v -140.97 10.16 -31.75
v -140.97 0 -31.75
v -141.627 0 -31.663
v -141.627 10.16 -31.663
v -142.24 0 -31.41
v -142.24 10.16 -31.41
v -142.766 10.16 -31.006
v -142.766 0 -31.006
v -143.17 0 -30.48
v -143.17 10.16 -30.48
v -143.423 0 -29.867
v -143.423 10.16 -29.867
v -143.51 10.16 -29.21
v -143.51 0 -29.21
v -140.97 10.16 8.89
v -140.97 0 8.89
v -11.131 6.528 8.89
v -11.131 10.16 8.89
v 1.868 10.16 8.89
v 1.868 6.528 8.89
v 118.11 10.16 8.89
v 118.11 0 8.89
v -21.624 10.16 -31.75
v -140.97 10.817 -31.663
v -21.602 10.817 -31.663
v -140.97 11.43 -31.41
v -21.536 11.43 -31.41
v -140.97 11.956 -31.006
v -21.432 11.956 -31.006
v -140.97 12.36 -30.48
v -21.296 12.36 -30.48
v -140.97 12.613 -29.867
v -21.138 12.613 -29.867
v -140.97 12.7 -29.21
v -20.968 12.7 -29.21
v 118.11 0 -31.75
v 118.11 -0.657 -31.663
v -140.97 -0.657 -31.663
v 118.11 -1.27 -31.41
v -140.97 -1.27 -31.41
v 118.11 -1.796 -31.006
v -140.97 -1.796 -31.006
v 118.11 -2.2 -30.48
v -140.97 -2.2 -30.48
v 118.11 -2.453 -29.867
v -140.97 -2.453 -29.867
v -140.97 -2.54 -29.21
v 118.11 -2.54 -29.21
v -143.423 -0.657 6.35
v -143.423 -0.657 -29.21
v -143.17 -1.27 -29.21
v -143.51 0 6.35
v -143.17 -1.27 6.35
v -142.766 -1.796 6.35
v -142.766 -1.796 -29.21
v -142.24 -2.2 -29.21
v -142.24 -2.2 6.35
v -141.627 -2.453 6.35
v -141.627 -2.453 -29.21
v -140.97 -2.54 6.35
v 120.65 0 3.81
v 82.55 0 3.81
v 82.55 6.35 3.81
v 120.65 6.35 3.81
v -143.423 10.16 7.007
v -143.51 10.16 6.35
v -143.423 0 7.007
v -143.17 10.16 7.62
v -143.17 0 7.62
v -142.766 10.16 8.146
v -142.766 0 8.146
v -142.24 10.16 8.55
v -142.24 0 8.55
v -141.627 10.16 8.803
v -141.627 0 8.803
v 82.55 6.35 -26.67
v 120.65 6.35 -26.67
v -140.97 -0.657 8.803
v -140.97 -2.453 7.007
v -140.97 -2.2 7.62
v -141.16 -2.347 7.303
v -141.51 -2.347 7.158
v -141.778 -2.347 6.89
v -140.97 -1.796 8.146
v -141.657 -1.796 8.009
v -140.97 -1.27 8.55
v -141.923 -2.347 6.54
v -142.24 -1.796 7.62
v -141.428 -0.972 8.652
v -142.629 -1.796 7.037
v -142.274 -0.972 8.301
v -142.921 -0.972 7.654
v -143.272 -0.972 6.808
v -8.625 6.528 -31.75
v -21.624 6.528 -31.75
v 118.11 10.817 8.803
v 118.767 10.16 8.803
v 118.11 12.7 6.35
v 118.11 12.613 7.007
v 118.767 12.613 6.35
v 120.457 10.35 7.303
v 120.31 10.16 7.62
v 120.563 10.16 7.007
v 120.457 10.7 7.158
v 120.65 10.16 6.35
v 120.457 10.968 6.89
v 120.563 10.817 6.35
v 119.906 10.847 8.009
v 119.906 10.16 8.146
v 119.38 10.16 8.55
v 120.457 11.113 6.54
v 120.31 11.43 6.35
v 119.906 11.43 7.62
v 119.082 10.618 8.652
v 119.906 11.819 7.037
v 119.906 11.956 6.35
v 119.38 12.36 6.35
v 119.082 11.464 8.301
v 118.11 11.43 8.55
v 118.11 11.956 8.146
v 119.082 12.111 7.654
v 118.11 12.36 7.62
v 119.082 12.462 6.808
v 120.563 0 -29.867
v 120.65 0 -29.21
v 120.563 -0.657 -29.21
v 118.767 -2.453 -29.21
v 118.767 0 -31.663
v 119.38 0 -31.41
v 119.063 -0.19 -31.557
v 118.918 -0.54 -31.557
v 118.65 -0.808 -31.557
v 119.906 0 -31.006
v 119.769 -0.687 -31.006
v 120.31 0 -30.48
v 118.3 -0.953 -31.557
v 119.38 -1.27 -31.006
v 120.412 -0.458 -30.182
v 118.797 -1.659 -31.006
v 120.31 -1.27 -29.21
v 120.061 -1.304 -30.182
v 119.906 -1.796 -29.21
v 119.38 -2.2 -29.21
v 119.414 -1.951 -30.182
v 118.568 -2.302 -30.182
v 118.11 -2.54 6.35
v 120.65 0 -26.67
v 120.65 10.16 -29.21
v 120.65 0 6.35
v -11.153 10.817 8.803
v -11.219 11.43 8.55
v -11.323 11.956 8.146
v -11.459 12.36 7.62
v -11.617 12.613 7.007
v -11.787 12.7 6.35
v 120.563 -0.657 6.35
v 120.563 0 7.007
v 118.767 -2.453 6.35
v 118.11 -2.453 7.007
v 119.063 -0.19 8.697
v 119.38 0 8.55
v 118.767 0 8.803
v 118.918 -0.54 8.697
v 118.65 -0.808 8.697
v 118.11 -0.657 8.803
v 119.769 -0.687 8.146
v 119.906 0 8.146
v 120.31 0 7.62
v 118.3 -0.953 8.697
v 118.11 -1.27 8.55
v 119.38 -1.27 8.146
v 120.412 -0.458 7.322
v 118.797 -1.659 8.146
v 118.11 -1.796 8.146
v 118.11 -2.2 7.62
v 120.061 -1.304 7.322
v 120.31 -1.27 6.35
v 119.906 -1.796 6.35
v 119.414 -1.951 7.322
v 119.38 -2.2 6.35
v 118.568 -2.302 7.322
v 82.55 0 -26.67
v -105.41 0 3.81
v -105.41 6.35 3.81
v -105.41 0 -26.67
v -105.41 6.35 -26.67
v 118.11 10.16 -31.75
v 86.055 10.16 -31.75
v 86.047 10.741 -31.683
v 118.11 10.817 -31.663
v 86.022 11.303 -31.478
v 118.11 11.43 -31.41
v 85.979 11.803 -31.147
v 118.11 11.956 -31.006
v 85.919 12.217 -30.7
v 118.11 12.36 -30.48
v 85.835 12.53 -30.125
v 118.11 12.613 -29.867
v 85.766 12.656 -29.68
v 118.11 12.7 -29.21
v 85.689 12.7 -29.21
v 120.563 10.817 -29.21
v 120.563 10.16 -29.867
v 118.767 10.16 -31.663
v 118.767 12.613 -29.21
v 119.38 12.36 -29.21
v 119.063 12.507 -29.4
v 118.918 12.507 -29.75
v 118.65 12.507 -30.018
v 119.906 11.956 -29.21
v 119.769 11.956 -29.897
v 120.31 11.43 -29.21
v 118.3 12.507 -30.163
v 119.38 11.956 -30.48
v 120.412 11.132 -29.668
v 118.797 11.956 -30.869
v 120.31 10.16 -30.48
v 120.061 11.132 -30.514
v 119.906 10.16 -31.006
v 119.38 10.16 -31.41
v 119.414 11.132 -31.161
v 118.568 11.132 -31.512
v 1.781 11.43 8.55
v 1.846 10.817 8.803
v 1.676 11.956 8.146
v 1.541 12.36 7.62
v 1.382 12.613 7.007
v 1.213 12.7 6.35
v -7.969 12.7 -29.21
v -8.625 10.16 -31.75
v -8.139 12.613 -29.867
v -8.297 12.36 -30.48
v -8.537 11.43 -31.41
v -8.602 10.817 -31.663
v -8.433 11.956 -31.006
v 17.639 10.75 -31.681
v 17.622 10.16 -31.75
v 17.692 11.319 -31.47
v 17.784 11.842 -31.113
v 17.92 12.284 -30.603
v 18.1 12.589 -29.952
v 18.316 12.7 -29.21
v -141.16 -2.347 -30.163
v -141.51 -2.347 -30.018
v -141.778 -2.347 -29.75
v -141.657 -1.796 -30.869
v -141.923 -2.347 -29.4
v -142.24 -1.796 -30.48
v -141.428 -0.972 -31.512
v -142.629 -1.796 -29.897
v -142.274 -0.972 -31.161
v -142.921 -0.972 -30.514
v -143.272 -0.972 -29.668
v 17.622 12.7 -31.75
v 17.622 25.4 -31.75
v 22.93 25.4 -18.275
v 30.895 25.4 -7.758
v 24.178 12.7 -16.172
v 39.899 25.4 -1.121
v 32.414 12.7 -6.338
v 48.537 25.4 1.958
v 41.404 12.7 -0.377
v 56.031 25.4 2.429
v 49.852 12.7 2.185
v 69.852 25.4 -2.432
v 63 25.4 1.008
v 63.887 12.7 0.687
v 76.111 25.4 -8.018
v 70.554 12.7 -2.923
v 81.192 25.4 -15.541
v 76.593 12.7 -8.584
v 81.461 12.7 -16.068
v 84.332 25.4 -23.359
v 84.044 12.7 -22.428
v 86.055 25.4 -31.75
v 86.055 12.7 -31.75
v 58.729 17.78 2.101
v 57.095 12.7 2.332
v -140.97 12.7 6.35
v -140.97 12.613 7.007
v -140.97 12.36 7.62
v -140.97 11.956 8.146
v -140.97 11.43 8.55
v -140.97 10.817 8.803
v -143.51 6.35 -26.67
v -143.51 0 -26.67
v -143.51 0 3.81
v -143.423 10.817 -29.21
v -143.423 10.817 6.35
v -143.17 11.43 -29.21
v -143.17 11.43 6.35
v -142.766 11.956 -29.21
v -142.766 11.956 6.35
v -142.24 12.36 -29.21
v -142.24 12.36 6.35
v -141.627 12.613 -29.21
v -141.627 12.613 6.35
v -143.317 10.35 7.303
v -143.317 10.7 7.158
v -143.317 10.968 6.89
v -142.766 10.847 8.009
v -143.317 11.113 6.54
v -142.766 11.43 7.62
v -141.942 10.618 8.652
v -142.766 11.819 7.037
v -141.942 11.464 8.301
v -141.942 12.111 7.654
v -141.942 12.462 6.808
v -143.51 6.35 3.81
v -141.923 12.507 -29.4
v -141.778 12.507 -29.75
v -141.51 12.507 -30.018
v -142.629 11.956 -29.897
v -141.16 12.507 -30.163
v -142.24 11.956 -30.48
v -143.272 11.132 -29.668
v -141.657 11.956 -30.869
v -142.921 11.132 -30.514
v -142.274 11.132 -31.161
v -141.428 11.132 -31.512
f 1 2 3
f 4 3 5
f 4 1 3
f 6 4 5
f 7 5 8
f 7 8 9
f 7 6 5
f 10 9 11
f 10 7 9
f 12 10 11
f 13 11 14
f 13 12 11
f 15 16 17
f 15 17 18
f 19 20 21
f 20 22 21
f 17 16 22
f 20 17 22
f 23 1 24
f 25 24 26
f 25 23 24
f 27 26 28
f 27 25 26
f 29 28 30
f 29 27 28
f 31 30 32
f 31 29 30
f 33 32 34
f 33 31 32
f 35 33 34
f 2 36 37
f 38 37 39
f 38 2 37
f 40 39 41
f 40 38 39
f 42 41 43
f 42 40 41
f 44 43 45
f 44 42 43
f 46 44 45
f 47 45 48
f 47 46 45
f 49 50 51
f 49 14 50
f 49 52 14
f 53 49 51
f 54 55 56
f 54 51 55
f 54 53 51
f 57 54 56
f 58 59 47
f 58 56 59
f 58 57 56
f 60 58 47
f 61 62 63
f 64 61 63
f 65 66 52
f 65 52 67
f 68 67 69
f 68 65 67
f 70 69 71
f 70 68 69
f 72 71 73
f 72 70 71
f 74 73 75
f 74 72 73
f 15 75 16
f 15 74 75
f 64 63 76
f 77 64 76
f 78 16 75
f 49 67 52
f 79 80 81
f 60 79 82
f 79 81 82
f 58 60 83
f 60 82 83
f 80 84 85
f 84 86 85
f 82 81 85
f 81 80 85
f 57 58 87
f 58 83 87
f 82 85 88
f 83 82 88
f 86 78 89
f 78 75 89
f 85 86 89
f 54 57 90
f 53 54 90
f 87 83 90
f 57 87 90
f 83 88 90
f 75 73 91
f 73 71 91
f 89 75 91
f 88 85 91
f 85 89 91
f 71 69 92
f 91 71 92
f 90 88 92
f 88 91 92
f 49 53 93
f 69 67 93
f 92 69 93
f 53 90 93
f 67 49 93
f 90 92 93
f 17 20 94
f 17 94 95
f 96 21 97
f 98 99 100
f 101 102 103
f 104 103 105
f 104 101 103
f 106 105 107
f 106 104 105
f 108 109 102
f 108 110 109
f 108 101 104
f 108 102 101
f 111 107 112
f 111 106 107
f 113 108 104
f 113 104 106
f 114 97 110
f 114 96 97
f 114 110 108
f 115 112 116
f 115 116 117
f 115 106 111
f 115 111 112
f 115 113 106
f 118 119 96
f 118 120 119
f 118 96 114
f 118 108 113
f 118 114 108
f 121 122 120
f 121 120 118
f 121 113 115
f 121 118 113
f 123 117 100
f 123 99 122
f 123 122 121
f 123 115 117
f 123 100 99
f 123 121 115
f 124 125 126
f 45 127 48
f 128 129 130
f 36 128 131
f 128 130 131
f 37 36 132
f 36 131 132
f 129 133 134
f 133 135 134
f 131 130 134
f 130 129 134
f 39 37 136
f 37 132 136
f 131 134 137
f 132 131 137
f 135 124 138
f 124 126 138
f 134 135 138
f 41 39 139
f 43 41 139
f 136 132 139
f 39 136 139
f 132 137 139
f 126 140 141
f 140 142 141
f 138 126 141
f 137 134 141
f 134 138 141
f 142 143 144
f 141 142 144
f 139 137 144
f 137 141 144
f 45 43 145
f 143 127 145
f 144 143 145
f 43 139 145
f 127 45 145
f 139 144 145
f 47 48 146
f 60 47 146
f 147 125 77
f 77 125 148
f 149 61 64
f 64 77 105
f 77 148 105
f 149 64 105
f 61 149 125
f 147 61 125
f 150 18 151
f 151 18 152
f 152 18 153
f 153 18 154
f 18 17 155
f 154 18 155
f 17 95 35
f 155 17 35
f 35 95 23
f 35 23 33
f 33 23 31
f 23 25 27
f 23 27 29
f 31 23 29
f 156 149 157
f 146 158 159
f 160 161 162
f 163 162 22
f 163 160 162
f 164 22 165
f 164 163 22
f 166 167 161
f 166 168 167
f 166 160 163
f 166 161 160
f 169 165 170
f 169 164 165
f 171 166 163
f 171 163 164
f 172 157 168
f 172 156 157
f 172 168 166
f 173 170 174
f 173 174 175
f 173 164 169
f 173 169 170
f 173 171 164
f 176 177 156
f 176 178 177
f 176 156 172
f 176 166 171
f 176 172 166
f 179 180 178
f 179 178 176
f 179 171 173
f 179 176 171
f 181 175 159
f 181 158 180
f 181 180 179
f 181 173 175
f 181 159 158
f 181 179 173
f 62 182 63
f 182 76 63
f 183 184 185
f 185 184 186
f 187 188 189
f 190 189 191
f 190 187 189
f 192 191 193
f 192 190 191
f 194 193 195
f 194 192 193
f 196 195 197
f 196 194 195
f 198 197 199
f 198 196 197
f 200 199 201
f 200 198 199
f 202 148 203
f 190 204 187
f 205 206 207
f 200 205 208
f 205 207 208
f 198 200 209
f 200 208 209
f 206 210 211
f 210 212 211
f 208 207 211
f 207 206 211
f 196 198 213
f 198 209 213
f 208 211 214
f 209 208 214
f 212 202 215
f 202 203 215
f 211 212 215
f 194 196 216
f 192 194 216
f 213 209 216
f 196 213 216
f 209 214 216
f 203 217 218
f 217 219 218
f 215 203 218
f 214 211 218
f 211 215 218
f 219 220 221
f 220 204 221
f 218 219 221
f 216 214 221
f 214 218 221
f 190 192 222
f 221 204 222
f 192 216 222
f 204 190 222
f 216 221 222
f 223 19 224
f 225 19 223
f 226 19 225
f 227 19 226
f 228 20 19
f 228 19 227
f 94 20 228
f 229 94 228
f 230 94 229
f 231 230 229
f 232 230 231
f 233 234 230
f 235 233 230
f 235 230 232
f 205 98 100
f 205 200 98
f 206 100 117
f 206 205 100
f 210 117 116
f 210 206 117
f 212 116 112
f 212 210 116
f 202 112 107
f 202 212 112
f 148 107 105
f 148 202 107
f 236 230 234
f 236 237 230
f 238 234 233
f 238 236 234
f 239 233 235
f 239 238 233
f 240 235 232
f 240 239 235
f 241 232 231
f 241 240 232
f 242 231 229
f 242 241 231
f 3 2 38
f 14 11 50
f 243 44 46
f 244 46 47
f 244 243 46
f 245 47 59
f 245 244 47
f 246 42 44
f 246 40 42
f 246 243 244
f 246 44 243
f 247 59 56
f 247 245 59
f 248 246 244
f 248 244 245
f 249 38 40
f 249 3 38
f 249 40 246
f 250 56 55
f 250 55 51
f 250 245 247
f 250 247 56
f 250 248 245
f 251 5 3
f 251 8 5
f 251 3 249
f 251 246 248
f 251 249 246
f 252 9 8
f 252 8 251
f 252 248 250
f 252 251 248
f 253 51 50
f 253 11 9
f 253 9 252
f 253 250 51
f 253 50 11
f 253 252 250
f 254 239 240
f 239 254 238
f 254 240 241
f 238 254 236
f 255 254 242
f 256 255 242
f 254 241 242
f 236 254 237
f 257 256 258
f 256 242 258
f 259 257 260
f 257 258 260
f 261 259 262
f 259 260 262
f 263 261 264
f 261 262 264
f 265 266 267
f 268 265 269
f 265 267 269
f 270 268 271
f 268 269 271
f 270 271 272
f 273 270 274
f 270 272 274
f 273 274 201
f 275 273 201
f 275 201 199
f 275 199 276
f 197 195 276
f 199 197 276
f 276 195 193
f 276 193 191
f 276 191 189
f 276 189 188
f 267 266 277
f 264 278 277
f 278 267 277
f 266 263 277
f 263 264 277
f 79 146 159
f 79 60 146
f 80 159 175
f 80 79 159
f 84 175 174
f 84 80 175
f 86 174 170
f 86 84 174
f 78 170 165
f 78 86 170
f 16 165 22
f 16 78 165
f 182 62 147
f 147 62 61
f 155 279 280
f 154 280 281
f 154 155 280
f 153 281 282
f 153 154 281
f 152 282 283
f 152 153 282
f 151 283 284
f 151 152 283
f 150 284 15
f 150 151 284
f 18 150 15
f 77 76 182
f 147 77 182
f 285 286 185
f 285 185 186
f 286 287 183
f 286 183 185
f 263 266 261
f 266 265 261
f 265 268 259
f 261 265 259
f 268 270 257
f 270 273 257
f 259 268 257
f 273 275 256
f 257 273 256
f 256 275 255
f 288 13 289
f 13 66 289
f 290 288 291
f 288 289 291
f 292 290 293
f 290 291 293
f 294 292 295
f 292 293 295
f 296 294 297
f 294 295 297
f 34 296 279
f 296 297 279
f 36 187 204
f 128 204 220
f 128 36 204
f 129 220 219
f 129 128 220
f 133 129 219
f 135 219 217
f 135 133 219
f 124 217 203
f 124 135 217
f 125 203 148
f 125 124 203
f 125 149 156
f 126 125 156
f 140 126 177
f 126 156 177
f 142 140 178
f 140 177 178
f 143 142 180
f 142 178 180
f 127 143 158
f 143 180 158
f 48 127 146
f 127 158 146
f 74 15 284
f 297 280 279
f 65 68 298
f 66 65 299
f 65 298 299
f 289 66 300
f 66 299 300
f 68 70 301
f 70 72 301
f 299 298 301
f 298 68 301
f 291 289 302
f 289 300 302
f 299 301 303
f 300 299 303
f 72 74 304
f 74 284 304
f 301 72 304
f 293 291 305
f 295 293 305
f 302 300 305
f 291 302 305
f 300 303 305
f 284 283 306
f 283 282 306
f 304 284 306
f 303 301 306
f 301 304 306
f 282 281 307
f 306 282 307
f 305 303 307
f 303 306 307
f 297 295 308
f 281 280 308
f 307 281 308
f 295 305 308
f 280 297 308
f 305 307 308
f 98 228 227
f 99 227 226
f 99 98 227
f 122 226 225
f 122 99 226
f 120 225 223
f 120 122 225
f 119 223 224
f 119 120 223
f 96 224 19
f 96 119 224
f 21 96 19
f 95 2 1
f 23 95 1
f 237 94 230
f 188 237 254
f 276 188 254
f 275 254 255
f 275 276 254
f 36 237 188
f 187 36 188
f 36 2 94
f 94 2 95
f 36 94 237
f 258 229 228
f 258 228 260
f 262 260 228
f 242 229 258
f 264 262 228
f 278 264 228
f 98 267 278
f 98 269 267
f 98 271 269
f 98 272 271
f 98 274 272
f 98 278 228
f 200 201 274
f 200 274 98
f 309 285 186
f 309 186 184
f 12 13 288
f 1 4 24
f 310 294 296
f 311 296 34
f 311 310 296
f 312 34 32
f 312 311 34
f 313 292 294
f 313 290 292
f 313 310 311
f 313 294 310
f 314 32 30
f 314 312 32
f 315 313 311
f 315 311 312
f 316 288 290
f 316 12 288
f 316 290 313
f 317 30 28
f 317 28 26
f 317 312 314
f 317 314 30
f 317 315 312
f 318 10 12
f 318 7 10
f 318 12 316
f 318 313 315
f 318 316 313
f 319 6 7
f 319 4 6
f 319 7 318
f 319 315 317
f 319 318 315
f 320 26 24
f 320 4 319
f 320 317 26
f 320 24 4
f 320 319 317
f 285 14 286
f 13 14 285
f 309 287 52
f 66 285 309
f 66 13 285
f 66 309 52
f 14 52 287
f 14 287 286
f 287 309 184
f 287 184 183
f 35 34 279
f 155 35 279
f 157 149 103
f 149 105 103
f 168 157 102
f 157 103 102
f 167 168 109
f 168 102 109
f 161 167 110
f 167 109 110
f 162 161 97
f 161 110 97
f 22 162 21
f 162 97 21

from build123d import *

# Parameters (mm, degrees)
SKETCH1_W               = 279.4
SKETCH1_H               = 63.5
BOSS_EXTRUDE1_DEPTH     = 12.7
BOSS_EXTRUDE2_DEPTH     = 50.8
SKETCH4_W               = 12.586648523787707
SKETCH4_H               = 6.172140988773259
CUT_EXTRUDE1_DEPTH      = 187.15064931818
CUT_EXTRUDE2_DEPTH      = 191.3909441326203
CUT_EXTRUDE2_DEPTH_BACK = 191.3909441326203
SKETCH5_W               = 77.64929915814443
SKETCH5_H               = 50.80000000000001
BOSS_EXTRUDE3_DEPTH     = 12.7
CUT_EXTRUDE4_DEPTH      = 57.15
CUT_EXTRUDE5_DEPTH      = 149.14020610558435
SKETCH23_W              = 260.35
SKETCH23_H              = 63.5
BOSS_EXTRUDE4_DEPTH     = 2.54
CUT_EXTRUDE6_DEPTH      = 149.37954115889764
SKETCH27_W              = 286.4591757611205
SKETCH27_H              = 45.03610752945451
CUT_EXTRUDE7_DEPTH      = 145.07085099474523
SKETCH31_W              = 40.63999999999999
SKETCH31_H              = 15.239999999999998
BOSS_EXTRUDE6_DEPTH     = 3.8099999999999996
CUT_EXTRUDE10_DEPTH     = 38.1
FILLET3_R               = 2.54


with BuildPart() as part:
    # Sketch1 → Boss-Extrude1 (new body)
    with BuildSketch(Plane(origin=(0, 0, 0), x_dir=(1, 0, 0), z_dir=(0, 1, 0))):
        Rectangle(SKETCH1_W, SKETCH1_H)
    extrude(amount=BOSS_EXTRUDE1_DEPTH)

    # Sketch2 → Boss-Extrude2 (add)
    with BuildSketch(Plane(origin=(0, 12.7, 0), x_dir=(1, 0, 0), z_dir=(0, 1, 0))):
        Polygon((-47.69999999999997, -21.749999999999986), (-28.33508326896288, -16.749999999999986), (-44.21008326896288, 44.733610621042764), (-63.57499999999998, 39.73361062104277), align=None)
        Polygon((8.514130017407421, 43.733610621042764), (24.389130017407417, -17.74999999999999), (43.7540467484445, -12.749999999999984), (27.879046748444473, 48.733610621042764), align=None)
    extrude(amount=BOSS_EXTRUDE2_DEPTH)

    # Sketch4 → Cut-Extrude1 (cut, through all)
    with BuildSketch(Plane(origin=(-13.591413263749278, 0, -52.63931722192361), x_dir=(-0.9682458365518543, 0, 0.24999999999999972), z_dir=(-0.24999999999999972, 0, -0.9682458365518543))):
        with Locations((6.706675646106144, 9.613929505613372)):
            Rectangle(SKETCH4_W, SKETCH4_H)
    extrude(amount=-CUT_EXTRUDE1_DEPTH, mode=Mode.SUBTRACT)

    # Sketch5 → Cut-Extrude2 (cut, two sides: drawn at the far end of the back side and taken through both)
    with BuildSketch(Plane(origin=(-30.618670005213612, 0, 7.905706600880859), x_dir=(-0.2500000000000001, 0, -0.9682458365518543), z_dir=(0.9682458365518541, 0, -0.25000000000000006)).offset(-CUT_EXTRUDE2_DEPTH_BACK)):
        with Locations((15.541003475924965, 38.1)):
            Rectangle(SKETCH5_W, SKETCH5_H)
    extrude(amount=CUT_EXTRUDE2_DEPTH + CUT_EXTRUDE2_DEPTH_BACK, mode=Mode.SUBTRACT)

    # Sketch6 → Boss-Extrude3 (add)
    with BuildSketch(Plane(origin=(0, 12.7, 0), x_dir=(1, 0, 0), z_dir=(0, 1, 0))):
        with BuildLine():
            Line((16.77527777661138, 35.78638852333846), (85.61472706482589, 47.625000000000014))
            add(Edge.make_bspline(
                [(16.77527777661138, 35.78638852333846), (24.308939625396, -8.020533750979865), (58.728664269503255, -2.101228012649095), (93.14838891361052, 3.8180777256816754), (85.61472706482589, 47.625000000000014)],
                knots=[4.71238898038469, 4.71238898038469, 4.71238898038469, 6.283185307179586, 6.283185307179586, 7.853981633974483, 7.853981633974483, 7.853981633974483], degree=2, weights=[1, 0.7071067811865476, 1, 0.7071067811865476, 1]))
        make_face()
    extrude(amount=BOSS_EXTRUDE3_DEPTH)

    # Sketch17 → Cut-Extrude4 (cut)
    with BuildSketch(Plane(origin=(139.70000000000002, 0, 0), x_dir=(0, 0, -1), z_dir=(1, 0, 0))):
        Polygon((26.670000000000012, -1.52e-15), (-3.80999999999998, -5.2e-15), (-3.80999999999998, 6.349999999999993), (26.670000000000012, 6.349999999999996), align=None)
    extrude(amount=-CUT_EXTRUDE4_DEPTH, mode=Mode.SUBTRACT)

    # Sketch22 → Cut-Extrude5 (cut, through all)
    with BuildSketch(Plane(origin=(0, 12.7, 0), x_dir=(1, 0, 0), z_dir=(0, 1, 0))):
        Polygon((139.70000000000002, -32.204899371851745), (120.65000000000002, -32.204899371851745), (120.65000000000002, 31.750000000000014), (139.70000000000005, 31.750000000000014), align=None)
    extrude(amount=-CUT_EXTRUDE5_DEPTH, mode=Mode.SUBTRACT)

    # Sketch23 → Boss-Extrude4 (add)
    with BuildSketch(Plane.XZ):
        with Locations((-9.524999999999963, -1.421e-14)):
            Rectangle(SKETCH23_W, SKETCH23_H)
    extrude(amount=BOSS_EXTRUDE4_DEPTH)

    # Sketch25 → Cut-Extrude6 (cut, through all)
    with BuildSketch(Plane.XZ.offset(-12.7)):
        with BuildLine():
            Line((86.05470968261828, -31.750000000000014), (17.622098670079023, -31.750000000000014))
            add(Edge.make_bspline(
                [(17.622098670079023, -31.750000000000014), (17.12530185096651, -33.75105992388856), (16.77527777661137, -35.78638852333846)],
                knots=[1.4779404098519116, 1.4779404098519116, 1.4779404098519116, 1.5707963267948968, 1.5707963267948968, 1.5707963267948968], degree=2, weights=[1, 0.9989224159229568, 1]))
            Line((16.77527777661137, -35.78638852333846), (85.6147270648259, -47.62500000000003))
            add(Edge.make_bspline(
                [(85.6147270648259, -47.62500000000003), (86.99136168467464, -39.620111142189245), (86.05470968261828, -31.750000000000014)],
                knots=[4.71238898038469, 4.71238898038469, 4.71238898038469, 5.073863183068598, 5.073863183068598, 5.073863183068598], degree=2, weights=[1, 0.9837114625910768, 1]))
        make_face()
    extrude(amount=-CUT_EXTRUDE6_DEPTH, mode=Mode.SUBTRACT)

    # Sketch27 → Cut-Extrude7 (cut, through all)
    with BuildSketch(Plane(origin=(0, 12.7, 0), x_dir=(1, 0, 0), z_dir=(0, 1, 0))):
        with Locations((-9.278901051751589, -31.408053764727235)):
            Rectangle(SKETCH27_W, SKETCH27_H)
    extrude(amount=-CUT_EXTRUDE7_DEPTH, mode=Mode.SUBTRACT)

    # Sketch31 → Boss-Extrude6 (add)
    with BuildSketch(Plane.ZY.offset(139.69999999999996)):
        with Locations((-11.430000000000017, 5.079999999999998)):
            Rectangle(SKETCH31_W, SKETCH31_H)
    extrude(amount=BOSS_EXTRUDE6_DEPTH)

    # Sketch32 → Cut-Extrude10 (cut)
    with BuildSketch(Plane.ZY.offset(143.50999999999996)):
        Polygon((-26.67000000000002, 6.35), (3.80999999999998, 6.35), (3.809999999999981, 0), (-26.67000000000002, 0), align=None)
    extrude(amount=-CUT_EXTRUDE10_DEPTH, mode=Mode.SUBTRACT)

    # Fillet3
    fillet3_edges = [part.edges().sort_by_distance(p)[0] for p in [
        (61.259240327968, 12.7, 8.889999999999981),
        (-77.32047702099145, 12.7, 8.889999999999983),
        (120.65000000000002, -2.54, -11.430000000000021),
        (-143.50999999999996, 5.079999999999999, 8.889999999999981),
        (-143.50999999999996, 5.08, -31.750000000000014),
        (120.65000000000002, 5.079999999999999, -31.750000000000014),
        (120.65000000000002, 5.08, 8.88999999999998),
        (-11.429999999999964, -2.54, -31.750000000000014),
        (-11.429999999999964, -2.54, 8.88999999999998),
        (-143.50999999999996, -2.54, -11.430000000000017),
        (120.65000000000002, 12.7, -11.430000000000014),
        (103.35235484130929, 12.7, -31.750000000000014),
        (4.49868822334534, 12.7, -31.750000000000014),
        (-143.50999999999996, 12.7, -11.430000000000016),
        (-82.56707846065376, 12.7, -31.750000000000014),
    ]]
    fillet(fillet3_edges, radius=FILLET3_R - 0.0001)  # a hair under: the kernel refuses the full size


solid = part.part
